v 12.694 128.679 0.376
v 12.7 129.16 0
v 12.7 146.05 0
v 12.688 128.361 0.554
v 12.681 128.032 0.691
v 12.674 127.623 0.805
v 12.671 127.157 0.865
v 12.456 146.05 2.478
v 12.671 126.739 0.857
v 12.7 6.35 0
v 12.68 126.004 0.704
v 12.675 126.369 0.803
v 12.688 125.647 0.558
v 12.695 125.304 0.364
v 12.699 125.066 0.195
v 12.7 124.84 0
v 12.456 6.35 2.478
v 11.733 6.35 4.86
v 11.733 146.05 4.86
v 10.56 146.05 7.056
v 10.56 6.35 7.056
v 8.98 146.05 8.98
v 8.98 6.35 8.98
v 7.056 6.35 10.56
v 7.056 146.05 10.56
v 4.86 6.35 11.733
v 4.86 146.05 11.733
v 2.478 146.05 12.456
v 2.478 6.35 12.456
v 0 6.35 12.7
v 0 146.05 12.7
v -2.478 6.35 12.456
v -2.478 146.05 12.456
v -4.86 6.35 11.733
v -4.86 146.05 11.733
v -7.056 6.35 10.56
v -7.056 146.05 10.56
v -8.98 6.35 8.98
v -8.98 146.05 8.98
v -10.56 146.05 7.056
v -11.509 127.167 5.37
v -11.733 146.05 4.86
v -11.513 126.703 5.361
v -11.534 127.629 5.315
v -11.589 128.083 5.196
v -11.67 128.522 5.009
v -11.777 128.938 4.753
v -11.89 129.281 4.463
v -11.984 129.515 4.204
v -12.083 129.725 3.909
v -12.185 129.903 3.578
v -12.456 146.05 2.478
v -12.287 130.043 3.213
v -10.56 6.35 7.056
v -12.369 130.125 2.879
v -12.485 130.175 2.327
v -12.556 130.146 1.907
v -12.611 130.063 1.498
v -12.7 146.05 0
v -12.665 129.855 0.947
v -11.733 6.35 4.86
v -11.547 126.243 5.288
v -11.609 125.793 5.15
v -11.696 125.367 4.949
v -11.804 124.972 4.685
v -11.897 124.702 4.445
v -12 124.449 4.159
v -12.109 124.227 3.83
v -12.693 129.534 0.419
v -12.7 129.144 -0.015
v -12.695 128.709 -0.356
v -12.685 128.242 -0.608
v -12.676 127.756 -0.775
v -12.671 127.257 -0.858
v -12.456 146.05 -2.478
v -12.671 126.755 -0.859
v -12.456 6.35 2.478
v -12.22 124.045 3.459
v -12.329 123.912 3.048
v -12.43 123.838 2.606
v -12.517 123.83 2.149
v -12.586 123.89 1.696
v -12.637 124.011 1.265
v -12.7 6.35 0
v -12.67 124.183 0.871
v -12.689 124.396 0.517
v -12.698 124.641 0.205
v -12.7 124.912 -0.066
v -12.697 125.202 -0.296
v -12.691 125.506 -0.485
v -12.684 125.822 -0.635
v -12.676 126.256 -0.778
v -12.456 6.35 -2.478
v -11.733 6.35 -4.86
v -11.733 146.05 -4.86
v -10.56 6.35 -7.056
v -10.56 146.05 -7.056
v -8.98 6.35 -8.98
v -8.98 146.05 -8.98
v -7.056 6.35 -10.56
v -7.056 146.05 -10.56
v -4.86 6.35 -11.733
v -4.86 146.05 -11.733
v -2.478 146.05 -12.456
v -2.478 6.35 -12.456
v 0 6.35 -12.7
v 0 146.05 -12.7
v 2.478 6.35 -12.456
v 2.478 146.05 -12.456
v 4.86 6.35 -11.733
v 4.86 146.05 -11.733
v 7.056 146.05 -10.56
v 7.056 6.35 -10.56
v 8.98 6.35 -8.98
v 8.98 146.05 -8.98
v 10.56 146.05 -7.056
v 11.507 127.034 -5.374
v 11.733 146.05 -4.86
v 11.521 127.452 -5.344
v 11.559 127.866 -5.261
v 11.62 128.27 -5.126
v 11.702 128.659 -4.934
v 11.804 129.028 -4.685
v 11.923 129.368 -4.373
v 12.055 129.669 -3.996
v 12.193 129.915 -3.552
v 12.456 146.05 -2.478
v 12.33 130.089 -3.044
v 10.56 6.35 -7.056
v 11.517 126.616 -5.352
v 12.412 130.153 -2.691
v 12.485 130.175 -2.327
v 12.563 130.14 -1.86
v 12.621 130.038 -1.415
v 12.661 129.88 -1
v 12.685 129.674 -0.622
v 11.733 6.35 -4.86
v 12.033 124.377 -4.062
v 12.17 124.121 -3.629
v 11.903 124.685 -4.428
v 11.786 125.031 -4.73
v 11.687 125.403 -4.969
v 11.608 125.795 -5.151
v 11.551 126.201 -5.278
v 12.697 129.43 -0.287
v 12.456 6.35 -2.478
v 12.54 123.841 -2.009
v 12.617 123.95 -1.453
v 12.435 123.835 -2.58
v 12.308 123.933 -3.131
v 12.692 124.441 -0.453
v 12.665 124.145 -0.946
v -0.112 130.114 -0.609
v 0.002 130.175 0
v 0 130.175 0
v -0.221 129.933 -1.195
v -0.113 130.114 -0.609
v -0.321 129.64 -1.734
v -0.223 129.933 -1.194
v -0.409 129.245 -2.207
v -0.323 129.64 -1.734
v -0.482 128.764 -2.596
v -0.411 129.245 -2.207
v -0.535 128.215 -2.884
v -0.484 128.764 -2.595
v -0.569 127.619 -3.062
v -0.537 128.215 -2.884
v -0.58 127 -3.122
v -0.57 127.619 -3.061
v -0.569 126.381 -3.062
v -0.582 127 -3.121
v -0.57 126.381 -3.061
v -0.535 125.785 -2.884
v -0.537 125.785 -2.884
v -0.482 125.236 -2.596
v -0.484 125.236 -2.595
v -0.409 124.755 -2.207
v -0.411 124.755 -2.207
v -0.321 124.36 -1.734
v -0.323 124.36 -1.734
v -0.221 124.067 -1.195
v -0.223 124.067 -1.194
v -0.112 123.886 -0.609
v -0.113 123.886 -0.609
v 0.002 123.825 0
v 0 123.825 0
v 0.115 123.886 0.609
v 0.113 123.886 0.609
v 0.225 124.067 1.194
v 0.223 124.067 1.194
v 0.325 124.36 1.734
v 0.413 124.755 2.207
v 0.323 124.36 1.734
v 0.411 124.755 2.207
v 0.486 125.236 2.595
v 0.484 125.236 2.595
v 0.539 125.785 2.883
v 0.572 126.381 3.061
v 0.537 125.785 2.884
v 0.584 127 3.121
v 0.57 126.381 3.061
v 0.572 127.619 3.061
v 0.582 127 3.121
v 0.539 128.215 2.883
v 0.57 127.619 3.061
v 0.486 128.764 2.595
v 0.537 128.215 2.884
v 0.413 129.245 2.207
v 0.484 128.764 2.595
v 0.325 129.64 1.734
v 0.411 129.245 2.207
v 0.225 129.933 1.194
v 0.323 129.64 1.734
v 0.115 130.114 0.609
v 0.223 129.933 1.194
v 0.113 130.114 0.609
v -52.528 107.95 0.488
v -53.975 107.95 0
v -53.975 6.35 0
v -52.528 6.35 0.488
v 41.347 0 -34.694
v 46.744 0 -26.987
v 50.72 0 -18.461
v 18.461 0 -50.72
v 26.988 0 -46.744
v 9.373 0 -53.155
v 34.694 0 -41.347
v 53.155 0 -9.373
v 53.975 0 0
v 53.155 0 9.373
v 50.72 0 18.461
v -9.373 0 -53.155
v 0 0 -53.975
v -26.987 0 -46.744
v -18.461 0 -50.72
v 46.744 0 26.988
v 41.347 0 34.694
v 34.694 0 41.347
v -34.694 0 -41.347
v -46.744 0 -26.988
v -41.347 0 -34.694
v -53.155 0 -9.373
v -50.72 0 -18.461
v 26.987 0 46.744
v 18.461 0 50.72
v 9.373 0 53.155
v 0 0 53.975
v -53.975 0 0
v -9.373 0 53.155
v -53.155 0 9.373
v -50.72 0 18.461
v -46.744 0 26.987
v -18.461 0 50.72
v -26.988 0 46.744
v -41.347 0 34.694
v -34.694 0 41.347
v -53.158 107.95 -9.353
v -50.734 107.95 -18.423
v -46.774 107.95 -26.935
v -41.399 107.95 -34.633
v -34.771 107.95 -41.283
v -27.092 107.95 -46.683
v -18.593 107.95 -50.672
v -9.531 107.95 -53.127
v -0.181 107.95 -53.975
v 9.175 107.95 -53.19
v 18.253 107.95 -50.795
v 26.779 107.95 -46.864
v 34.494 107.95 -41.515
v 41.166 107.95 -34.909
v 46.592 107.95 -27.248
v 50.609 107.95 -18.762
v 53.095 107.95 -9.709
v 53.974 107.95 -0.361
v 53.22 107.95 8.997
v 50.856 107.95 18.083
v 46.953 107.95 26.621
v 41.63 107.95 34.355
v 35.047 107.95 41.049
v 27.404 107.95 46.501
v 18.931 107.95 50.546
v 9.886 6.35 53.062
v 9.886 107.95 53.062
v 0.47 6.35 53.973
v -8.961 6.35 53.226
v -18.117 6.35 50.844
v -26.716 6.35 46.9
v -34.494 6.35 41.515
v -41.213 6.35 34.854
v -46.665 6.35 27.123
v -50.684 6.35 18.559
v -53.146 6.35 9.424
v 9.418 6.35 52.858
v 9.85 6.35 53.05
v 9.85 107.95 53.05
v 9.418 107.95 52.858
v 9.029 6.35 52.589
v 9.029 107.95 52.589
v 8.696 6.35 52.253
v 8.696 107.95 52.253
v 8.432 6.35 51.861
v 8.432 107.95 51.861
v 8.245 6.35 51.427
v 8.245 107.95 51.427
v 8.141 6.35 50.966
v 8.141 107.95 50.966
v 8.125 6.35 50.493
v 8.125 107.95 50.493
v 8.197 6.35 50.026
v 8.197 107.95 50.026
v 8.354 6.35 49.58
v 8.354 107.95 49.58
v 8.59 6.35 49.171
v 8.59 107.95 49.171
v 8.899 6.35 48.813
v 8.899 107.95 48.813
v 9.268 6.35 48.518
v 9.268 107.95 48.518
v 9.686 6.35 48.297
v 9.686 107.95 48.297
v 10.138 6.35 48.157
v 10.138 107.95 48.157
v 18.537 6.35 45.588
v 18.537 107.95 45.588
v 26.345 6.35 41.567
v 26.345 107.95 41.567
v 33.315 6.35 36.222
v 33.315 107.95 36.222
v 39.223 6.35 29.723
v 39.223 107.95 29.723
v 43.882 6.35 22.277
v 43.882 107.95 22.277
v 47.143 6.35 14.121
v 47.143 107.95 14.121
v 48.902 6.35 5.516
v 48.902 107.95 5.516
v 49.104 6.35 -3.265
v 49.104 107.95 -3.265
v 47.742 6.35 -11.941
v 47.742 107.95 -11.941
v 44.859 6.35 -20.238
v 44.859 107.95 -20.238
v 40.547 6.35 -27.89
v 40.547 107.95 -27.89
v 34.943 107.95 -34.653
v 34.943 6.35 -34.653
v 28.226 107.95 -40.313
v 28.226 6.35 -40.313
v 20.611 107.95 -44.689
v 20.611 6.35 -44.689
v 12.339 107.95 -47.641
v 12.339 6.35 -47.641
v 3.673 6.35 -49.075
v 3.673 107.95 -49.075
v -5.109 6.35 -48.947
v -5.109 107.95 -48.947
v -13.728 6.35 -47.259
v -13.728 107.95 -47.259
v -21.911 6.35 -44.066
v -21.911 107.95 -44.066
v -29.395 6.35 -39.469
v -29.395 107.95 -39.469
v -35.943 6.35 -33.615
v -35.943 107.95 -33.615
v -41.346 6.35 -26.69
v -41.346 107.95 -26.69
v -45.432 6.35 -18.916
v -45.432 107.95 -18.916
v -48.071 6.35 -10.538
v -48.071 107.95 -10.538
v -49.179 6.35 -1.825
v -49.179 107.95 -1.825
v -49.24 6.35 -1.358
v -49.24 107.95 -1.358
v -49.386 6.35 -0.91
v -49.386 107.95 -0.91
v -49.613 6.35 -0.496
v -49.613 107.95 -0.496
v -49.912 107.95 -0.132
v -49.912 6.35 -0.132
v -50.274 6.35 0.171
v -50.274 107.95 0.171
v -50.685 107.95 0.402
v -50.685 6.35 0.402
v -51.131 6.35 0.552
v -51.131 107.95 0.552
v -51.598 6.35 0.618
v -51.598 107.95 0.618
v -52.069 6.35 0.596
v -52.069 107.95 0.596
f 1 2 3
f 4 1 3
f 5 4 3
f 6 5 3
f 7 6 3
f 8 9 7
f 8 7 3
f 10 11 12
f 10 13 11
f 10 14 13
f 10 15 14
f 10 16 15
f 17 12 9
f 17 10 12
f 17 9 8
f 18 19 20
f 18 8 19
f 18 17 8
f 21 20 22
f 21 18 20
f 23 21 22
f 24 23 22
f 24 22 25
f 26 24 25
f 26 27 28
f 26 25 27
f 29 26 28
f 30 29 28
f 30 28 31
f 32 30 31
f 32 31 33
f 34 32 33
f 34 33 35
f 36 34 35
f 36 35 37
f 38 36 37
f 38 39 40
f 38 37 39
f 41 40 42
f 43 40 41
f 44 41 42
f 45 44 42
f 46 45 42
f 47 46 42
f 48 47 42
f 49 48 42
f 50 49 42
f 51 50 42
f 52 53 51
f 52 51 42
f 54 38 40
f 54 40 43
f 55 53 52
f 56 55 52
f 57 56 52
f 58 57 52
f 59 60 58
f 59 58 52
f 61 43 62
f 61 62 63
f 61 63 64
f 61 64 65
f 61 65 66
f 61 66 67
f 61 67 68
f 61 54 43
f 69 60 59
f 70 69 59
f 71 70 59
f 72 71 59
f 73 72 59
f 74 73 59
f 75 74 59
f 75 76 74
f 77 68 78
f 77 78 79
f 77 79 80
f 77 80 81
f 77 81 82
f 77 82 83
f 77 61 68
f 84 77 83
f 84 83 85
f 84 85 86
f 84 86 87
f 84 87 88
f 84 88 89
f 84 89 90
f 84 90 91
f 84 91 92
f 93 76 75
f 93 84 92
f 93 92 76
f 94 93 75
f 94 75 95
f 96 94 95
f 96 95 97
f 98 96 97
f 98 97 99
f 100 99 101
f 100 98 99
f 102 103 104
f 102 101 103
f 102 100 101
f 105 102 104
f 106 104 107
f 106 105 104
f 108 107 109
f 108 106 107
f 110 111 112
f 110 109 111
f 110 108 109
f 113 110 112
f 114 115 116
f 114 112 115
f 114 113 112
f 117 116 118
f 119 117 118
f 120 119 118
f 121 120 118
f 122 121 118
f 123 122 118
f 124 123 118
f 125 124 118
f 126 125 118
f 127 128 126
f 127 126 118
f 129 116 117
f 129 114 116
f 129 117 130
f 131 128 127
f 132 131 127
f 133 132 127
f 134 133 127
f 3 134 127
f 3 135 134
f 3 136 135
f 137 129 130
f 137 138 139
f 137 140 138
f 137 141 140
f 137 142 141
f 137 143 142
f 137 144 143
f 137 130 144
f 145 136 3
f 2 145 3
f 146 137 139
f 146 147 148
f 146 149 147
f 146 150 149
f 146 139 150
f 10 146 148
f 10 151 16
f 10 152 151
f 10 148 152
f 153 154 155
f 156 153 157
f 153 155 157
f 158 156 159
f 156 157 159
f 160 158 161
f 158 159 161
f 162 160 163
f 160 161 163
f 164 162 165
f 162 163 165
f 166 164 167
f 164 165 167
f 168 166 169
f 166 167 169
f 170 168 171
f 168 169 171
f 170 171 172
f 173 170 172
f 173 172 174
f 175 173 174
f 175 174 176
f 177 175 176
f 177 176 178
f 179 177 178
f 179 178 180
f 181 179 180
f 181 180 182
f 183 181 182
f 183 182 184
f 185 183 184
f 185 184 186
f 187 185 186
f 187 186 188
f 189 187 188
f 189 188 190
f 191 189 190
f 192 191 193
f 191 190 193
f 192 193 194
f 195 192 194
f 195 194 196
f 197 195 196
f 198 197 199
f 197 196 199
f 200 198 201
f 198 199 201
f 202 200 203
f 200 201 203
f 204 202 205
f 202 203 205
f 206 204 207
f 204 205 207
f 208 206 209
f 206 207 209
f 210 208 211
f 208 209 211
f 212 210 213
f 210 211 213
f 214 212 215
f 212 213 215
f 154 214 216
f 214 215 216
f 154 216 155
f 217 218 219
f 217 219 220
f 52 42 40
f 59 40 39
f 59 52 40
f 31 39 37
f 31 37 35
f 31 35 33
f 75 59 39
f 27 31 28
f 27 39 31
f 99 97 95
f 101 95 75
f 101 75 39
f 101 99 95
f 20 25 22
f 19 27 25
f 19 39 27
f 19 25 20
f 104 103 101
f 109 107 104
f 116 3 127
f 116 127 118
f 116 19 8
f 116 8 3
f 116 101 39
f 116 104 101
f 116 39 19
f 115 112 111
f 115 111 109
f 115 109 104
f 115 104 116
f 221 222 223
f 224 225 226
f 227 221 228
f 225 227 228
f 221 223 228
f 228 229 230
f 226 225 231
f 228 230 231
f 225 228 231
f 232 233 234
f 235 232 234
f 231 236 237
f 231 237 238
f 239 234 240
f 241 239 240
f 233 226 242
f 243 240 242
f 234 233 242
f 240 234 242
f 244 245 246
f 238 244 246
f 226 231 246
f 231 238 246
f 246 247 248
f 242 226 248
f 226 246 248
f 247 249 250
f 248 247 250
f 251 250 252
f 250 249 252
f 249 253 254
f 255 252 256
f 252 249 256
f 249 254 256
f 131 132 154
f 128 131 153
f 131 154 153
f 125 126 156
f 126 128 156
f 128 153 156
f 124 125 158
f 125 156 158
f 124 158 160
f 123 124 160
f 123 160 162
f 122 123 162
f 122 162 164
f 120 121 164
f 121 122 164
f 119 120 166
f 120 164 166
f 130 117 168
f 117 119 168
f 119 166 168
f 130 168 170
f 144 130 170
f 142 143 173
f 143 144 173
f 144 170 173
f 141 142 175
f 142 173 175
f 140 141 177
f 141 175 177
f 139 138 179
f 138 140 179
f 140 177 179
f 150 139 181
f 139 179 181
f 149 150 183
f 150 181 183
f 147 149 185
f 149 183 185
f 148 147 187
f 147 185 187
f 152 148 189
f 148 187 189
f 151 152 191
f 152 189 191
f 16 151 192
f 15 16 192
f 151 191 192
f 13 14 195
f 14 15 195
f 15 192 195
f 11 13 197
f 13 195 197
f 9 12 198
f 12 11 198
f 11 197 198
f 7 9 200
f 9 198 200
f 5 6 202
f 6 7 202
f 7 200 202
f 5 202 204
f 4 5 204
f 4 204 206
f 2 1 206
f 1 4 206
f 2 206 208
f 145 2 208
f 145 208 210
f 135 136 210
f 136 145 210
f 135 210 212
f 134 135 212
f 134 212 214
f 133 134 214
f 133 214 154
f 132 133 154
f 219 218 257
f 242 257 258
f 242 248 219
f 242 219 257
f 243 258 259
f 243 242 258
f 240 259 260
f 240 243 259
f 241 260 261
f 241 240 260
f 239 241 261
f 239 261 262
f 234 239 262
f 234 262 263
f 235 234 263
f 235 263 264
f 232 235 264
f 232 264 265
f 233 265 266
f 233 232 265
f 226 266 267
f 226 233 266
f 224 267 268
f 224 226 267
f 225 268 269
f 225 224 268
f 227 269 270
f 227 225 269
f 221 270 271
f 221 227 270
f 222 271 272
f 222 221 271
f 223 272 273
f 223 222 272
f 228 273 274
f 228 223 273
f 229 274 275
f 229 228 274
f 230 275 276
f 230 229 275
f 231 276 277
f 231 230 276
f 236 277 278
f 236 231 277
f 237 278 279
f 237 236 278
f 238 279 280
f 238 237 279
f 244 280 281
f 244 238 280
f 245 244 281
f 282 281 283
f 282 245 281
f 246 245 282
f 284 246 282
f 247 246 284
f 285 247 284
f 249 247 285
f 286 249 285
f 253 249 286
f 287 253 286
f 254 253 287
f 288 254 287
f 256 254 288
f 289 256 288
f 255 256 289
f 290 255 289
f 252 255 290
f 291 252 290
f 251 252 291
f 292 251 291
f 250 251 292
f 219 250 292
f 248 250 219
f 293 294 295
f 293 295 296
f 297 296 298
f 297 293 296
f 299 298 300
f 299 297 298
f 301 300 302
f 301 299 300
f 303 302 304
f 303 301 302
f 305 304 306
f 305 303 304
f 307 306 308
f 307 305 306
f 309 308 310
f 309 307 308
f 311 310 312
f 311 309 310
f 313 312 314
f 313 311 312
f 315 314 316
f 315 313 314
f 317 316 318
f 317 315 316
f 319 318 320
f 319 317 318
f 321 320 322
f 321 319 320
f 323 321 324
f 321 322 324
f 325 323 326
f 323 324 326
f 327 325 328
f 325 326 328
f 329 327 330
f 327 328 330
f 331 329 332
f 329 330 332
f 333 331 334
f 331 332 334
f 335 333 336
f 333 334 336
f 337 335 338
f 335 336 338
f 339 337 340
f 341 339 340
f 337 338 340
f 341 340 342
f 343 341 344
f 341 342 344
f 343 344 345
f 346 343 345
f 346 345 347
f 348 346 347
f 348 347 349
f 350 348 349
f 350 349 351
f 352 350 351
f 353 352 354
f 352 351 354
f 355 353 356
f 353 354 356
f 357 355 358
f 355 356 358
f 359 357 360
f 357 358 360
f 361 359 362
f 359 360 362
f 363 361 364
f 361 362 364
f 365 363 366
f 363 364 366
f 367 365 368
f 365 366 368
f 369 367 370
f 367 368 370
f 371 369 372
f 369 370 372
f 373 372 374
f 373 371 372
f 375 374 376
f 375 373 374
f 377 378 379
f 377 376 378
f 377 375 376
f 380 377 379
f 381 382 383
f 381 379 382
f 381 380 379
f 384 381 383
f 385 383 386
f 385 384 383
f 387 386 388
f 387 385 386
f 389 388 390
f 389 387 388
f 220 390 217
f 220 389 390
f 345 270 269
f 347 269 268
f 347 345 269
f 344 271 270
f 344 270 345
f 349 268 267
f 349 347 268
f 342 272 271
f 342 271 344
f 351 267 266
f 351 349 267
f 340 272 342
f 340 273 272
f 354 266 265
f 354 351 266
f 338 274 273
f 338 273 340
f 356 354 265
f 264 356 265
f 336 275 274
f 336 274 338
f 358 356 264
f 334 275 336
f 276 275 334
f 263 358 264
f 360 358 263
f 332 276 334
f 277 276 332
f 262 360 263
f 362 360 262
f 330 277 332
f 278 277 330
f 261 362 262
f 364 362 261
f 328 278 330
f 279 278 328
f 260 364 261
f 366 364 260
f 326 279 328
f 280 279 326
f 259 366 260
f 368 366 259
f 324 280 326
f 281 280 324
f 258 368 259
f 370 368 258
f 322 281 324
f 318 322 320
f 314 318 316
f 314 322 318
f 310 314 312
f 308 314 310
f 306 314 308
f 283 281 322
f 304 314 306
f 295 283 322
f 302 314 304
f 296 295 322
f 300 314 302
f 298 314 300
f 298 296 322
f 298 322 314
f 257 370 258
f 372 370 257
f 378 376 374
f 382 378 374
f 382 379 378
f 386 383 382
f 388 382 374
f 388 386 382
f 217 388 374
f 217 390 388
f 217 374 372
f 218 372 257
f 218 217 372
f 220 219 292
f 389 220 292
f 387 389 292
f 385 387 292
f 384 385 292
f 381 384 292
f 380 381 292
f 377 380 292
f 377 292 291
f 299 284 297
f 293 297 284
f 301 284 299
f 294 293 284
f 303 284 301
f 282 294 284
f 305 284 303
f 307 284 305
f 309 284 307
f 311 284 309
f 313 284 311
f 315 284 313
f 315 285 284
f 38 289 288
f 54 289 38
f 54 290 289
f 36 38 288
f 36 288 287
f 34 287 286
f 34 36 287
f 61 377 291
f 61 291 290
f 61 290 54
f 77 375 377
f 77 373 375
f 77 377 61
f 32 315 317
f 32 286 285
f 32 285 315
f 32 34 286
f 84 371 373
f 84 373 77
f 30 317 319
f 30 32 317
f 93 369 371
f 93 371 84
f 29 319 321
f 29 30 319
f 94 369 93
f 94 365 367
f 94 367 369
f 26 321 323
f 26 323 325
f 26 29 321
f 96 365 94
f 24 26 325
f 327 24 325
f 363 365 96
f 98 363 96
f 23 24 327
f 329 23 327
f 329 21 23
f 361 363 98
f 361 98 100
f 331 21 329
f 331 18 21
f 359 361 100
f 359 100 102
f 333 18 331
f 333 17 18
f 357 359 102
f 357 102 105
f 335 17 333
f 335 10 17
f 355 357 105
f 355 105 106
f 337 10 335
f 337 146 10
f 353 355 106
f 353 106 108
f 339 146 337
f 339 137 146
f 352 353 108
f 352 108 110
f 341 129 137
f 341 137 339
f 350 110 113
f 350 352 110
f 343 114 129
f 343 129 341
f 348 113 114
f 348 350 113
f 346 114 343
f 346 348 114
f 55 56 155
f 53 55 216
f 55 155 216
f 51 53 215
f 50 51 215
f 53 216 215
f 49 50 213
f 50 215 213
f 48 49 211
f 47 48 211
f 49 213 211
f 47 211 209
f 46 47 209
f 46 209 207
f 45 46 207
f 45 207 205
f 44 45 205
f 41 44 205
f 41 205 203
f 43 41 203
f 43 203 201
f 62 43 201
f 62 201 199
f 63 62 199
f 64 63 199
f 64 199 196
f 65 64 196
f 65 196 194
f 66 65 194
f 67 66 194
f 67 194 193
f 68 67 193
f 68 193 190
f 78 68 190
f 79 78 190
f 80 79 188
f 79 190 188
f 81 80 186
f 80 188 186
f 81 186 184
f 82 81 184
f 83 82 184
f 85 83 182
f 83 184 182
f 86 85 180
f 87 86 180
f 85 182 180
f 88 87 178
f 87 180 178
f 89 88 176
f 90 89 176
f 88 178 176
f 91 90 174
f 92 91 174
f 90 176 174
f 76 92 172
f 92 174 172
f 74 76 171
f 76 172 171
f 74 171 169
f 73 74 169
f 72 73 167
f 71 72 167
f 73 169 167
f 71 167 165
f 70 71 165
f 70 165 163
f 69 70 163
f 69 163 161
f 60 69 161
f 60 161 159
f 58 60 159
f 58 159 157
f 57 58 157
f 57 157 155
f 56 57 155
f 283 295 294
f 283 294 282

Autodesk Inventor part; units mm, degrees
ref_plane "YZ Plane" through (0, 0, 0) normal (1, 0, 0) x (0, 1, 0)
ref_plane "XZ Plane" through (0, 0, 0) normal (0, 1, 0) x (-1, 0, 0)
ref_plane "XY Plane" through (0, 0, 0) normal (0, 0, 1) x (1, 0, 0)
sketch "Sketch1" plane through (0, 0, 0) normal (0, 1, 0) x (-1, 0, 0)
  circle A0 centre (0, 0) radius 53.975
  dimension "d0" = 107.95
extrude "Extrusion1" add sketch "Sketch1" along normal blind 107.95
sketch "Sketch2" plane through (0, 107.95, 0) normal (0, 1, 0) x (1, 0, 0)
  arc A0 (-1.614, -49.186) -> (-49.186, -1.614) centre (0, 0) ccw
  circle A1 centre (0, 0) radius 53.975 projected
  line L0 (9.8864, -53.0619) -> (14.2923, -39.9886)
  line L1 (14.2923, -39.9886) -> (-59.1143, -15.2492)
  line L2 (-59.1143, -15.2492) -> (-53.975, 0)
  line L3 (-53.975, 0) -> (-49.186, -1.614)
  line L4 (-1.614, -49.186) -> (9.8864, -53.0619)
  dimension "d3" = 98.425
extrude "Extrusion2" cut sketch "Sketch2" against normal blind 101.6 contours L4 A1 L1 L0 A0 | L0 L1 A1 L3 A0
sketch "Sketch3" plane through (0, 6.35, 0) normal (0, 1, 0) x (1, 0, 0)
  circle A0 centre (0, 0) radius 12.7
  dimension "d7" = 25.4
extrude "Extrusion3" add sketch "Sketch3" along normal blind 139.7
ref_plane "Work Plane1" through (0, 6.35, 0) normal (0.9831, 0, -0.1832) x (0, 1, 0)
sketch "Sketch4" plane through (0, 6.35, 0) normal (0.9831, 0, -0.1832) x (0, 1, 0)
  circle A0 centre (120.65, 0) radius 3.175
  line L0 (139.7, -12.7) -> (139.7, 12.7) projected
  point P0 (-6.35, 0)
  dimension "d10" = 6.35
  dimension "d11" = 19.05
extrude "Extrusion4" cut sketch "Sketch4" along normal through all
sketch "Sketch5" plane through (0, 6.35, 0) normal (0.9831, 0, -0.1832) x (0, 1, 0)
  circle A0 centre (120.65, 0) radius 3.175 projected
  circle A1 centre (120.65, 0) radius 3.175
  point P0 (-6.35, 0)
extrude "Extrusion5" cut sketch "Sketch5" against normal blind 139.7
fillet "Fillet2" radius 2.54 2 edges at (-49.186, 57.15, 1.614) (-1.614, 57.15, 49.186)
properties part number "Hand Holder"
